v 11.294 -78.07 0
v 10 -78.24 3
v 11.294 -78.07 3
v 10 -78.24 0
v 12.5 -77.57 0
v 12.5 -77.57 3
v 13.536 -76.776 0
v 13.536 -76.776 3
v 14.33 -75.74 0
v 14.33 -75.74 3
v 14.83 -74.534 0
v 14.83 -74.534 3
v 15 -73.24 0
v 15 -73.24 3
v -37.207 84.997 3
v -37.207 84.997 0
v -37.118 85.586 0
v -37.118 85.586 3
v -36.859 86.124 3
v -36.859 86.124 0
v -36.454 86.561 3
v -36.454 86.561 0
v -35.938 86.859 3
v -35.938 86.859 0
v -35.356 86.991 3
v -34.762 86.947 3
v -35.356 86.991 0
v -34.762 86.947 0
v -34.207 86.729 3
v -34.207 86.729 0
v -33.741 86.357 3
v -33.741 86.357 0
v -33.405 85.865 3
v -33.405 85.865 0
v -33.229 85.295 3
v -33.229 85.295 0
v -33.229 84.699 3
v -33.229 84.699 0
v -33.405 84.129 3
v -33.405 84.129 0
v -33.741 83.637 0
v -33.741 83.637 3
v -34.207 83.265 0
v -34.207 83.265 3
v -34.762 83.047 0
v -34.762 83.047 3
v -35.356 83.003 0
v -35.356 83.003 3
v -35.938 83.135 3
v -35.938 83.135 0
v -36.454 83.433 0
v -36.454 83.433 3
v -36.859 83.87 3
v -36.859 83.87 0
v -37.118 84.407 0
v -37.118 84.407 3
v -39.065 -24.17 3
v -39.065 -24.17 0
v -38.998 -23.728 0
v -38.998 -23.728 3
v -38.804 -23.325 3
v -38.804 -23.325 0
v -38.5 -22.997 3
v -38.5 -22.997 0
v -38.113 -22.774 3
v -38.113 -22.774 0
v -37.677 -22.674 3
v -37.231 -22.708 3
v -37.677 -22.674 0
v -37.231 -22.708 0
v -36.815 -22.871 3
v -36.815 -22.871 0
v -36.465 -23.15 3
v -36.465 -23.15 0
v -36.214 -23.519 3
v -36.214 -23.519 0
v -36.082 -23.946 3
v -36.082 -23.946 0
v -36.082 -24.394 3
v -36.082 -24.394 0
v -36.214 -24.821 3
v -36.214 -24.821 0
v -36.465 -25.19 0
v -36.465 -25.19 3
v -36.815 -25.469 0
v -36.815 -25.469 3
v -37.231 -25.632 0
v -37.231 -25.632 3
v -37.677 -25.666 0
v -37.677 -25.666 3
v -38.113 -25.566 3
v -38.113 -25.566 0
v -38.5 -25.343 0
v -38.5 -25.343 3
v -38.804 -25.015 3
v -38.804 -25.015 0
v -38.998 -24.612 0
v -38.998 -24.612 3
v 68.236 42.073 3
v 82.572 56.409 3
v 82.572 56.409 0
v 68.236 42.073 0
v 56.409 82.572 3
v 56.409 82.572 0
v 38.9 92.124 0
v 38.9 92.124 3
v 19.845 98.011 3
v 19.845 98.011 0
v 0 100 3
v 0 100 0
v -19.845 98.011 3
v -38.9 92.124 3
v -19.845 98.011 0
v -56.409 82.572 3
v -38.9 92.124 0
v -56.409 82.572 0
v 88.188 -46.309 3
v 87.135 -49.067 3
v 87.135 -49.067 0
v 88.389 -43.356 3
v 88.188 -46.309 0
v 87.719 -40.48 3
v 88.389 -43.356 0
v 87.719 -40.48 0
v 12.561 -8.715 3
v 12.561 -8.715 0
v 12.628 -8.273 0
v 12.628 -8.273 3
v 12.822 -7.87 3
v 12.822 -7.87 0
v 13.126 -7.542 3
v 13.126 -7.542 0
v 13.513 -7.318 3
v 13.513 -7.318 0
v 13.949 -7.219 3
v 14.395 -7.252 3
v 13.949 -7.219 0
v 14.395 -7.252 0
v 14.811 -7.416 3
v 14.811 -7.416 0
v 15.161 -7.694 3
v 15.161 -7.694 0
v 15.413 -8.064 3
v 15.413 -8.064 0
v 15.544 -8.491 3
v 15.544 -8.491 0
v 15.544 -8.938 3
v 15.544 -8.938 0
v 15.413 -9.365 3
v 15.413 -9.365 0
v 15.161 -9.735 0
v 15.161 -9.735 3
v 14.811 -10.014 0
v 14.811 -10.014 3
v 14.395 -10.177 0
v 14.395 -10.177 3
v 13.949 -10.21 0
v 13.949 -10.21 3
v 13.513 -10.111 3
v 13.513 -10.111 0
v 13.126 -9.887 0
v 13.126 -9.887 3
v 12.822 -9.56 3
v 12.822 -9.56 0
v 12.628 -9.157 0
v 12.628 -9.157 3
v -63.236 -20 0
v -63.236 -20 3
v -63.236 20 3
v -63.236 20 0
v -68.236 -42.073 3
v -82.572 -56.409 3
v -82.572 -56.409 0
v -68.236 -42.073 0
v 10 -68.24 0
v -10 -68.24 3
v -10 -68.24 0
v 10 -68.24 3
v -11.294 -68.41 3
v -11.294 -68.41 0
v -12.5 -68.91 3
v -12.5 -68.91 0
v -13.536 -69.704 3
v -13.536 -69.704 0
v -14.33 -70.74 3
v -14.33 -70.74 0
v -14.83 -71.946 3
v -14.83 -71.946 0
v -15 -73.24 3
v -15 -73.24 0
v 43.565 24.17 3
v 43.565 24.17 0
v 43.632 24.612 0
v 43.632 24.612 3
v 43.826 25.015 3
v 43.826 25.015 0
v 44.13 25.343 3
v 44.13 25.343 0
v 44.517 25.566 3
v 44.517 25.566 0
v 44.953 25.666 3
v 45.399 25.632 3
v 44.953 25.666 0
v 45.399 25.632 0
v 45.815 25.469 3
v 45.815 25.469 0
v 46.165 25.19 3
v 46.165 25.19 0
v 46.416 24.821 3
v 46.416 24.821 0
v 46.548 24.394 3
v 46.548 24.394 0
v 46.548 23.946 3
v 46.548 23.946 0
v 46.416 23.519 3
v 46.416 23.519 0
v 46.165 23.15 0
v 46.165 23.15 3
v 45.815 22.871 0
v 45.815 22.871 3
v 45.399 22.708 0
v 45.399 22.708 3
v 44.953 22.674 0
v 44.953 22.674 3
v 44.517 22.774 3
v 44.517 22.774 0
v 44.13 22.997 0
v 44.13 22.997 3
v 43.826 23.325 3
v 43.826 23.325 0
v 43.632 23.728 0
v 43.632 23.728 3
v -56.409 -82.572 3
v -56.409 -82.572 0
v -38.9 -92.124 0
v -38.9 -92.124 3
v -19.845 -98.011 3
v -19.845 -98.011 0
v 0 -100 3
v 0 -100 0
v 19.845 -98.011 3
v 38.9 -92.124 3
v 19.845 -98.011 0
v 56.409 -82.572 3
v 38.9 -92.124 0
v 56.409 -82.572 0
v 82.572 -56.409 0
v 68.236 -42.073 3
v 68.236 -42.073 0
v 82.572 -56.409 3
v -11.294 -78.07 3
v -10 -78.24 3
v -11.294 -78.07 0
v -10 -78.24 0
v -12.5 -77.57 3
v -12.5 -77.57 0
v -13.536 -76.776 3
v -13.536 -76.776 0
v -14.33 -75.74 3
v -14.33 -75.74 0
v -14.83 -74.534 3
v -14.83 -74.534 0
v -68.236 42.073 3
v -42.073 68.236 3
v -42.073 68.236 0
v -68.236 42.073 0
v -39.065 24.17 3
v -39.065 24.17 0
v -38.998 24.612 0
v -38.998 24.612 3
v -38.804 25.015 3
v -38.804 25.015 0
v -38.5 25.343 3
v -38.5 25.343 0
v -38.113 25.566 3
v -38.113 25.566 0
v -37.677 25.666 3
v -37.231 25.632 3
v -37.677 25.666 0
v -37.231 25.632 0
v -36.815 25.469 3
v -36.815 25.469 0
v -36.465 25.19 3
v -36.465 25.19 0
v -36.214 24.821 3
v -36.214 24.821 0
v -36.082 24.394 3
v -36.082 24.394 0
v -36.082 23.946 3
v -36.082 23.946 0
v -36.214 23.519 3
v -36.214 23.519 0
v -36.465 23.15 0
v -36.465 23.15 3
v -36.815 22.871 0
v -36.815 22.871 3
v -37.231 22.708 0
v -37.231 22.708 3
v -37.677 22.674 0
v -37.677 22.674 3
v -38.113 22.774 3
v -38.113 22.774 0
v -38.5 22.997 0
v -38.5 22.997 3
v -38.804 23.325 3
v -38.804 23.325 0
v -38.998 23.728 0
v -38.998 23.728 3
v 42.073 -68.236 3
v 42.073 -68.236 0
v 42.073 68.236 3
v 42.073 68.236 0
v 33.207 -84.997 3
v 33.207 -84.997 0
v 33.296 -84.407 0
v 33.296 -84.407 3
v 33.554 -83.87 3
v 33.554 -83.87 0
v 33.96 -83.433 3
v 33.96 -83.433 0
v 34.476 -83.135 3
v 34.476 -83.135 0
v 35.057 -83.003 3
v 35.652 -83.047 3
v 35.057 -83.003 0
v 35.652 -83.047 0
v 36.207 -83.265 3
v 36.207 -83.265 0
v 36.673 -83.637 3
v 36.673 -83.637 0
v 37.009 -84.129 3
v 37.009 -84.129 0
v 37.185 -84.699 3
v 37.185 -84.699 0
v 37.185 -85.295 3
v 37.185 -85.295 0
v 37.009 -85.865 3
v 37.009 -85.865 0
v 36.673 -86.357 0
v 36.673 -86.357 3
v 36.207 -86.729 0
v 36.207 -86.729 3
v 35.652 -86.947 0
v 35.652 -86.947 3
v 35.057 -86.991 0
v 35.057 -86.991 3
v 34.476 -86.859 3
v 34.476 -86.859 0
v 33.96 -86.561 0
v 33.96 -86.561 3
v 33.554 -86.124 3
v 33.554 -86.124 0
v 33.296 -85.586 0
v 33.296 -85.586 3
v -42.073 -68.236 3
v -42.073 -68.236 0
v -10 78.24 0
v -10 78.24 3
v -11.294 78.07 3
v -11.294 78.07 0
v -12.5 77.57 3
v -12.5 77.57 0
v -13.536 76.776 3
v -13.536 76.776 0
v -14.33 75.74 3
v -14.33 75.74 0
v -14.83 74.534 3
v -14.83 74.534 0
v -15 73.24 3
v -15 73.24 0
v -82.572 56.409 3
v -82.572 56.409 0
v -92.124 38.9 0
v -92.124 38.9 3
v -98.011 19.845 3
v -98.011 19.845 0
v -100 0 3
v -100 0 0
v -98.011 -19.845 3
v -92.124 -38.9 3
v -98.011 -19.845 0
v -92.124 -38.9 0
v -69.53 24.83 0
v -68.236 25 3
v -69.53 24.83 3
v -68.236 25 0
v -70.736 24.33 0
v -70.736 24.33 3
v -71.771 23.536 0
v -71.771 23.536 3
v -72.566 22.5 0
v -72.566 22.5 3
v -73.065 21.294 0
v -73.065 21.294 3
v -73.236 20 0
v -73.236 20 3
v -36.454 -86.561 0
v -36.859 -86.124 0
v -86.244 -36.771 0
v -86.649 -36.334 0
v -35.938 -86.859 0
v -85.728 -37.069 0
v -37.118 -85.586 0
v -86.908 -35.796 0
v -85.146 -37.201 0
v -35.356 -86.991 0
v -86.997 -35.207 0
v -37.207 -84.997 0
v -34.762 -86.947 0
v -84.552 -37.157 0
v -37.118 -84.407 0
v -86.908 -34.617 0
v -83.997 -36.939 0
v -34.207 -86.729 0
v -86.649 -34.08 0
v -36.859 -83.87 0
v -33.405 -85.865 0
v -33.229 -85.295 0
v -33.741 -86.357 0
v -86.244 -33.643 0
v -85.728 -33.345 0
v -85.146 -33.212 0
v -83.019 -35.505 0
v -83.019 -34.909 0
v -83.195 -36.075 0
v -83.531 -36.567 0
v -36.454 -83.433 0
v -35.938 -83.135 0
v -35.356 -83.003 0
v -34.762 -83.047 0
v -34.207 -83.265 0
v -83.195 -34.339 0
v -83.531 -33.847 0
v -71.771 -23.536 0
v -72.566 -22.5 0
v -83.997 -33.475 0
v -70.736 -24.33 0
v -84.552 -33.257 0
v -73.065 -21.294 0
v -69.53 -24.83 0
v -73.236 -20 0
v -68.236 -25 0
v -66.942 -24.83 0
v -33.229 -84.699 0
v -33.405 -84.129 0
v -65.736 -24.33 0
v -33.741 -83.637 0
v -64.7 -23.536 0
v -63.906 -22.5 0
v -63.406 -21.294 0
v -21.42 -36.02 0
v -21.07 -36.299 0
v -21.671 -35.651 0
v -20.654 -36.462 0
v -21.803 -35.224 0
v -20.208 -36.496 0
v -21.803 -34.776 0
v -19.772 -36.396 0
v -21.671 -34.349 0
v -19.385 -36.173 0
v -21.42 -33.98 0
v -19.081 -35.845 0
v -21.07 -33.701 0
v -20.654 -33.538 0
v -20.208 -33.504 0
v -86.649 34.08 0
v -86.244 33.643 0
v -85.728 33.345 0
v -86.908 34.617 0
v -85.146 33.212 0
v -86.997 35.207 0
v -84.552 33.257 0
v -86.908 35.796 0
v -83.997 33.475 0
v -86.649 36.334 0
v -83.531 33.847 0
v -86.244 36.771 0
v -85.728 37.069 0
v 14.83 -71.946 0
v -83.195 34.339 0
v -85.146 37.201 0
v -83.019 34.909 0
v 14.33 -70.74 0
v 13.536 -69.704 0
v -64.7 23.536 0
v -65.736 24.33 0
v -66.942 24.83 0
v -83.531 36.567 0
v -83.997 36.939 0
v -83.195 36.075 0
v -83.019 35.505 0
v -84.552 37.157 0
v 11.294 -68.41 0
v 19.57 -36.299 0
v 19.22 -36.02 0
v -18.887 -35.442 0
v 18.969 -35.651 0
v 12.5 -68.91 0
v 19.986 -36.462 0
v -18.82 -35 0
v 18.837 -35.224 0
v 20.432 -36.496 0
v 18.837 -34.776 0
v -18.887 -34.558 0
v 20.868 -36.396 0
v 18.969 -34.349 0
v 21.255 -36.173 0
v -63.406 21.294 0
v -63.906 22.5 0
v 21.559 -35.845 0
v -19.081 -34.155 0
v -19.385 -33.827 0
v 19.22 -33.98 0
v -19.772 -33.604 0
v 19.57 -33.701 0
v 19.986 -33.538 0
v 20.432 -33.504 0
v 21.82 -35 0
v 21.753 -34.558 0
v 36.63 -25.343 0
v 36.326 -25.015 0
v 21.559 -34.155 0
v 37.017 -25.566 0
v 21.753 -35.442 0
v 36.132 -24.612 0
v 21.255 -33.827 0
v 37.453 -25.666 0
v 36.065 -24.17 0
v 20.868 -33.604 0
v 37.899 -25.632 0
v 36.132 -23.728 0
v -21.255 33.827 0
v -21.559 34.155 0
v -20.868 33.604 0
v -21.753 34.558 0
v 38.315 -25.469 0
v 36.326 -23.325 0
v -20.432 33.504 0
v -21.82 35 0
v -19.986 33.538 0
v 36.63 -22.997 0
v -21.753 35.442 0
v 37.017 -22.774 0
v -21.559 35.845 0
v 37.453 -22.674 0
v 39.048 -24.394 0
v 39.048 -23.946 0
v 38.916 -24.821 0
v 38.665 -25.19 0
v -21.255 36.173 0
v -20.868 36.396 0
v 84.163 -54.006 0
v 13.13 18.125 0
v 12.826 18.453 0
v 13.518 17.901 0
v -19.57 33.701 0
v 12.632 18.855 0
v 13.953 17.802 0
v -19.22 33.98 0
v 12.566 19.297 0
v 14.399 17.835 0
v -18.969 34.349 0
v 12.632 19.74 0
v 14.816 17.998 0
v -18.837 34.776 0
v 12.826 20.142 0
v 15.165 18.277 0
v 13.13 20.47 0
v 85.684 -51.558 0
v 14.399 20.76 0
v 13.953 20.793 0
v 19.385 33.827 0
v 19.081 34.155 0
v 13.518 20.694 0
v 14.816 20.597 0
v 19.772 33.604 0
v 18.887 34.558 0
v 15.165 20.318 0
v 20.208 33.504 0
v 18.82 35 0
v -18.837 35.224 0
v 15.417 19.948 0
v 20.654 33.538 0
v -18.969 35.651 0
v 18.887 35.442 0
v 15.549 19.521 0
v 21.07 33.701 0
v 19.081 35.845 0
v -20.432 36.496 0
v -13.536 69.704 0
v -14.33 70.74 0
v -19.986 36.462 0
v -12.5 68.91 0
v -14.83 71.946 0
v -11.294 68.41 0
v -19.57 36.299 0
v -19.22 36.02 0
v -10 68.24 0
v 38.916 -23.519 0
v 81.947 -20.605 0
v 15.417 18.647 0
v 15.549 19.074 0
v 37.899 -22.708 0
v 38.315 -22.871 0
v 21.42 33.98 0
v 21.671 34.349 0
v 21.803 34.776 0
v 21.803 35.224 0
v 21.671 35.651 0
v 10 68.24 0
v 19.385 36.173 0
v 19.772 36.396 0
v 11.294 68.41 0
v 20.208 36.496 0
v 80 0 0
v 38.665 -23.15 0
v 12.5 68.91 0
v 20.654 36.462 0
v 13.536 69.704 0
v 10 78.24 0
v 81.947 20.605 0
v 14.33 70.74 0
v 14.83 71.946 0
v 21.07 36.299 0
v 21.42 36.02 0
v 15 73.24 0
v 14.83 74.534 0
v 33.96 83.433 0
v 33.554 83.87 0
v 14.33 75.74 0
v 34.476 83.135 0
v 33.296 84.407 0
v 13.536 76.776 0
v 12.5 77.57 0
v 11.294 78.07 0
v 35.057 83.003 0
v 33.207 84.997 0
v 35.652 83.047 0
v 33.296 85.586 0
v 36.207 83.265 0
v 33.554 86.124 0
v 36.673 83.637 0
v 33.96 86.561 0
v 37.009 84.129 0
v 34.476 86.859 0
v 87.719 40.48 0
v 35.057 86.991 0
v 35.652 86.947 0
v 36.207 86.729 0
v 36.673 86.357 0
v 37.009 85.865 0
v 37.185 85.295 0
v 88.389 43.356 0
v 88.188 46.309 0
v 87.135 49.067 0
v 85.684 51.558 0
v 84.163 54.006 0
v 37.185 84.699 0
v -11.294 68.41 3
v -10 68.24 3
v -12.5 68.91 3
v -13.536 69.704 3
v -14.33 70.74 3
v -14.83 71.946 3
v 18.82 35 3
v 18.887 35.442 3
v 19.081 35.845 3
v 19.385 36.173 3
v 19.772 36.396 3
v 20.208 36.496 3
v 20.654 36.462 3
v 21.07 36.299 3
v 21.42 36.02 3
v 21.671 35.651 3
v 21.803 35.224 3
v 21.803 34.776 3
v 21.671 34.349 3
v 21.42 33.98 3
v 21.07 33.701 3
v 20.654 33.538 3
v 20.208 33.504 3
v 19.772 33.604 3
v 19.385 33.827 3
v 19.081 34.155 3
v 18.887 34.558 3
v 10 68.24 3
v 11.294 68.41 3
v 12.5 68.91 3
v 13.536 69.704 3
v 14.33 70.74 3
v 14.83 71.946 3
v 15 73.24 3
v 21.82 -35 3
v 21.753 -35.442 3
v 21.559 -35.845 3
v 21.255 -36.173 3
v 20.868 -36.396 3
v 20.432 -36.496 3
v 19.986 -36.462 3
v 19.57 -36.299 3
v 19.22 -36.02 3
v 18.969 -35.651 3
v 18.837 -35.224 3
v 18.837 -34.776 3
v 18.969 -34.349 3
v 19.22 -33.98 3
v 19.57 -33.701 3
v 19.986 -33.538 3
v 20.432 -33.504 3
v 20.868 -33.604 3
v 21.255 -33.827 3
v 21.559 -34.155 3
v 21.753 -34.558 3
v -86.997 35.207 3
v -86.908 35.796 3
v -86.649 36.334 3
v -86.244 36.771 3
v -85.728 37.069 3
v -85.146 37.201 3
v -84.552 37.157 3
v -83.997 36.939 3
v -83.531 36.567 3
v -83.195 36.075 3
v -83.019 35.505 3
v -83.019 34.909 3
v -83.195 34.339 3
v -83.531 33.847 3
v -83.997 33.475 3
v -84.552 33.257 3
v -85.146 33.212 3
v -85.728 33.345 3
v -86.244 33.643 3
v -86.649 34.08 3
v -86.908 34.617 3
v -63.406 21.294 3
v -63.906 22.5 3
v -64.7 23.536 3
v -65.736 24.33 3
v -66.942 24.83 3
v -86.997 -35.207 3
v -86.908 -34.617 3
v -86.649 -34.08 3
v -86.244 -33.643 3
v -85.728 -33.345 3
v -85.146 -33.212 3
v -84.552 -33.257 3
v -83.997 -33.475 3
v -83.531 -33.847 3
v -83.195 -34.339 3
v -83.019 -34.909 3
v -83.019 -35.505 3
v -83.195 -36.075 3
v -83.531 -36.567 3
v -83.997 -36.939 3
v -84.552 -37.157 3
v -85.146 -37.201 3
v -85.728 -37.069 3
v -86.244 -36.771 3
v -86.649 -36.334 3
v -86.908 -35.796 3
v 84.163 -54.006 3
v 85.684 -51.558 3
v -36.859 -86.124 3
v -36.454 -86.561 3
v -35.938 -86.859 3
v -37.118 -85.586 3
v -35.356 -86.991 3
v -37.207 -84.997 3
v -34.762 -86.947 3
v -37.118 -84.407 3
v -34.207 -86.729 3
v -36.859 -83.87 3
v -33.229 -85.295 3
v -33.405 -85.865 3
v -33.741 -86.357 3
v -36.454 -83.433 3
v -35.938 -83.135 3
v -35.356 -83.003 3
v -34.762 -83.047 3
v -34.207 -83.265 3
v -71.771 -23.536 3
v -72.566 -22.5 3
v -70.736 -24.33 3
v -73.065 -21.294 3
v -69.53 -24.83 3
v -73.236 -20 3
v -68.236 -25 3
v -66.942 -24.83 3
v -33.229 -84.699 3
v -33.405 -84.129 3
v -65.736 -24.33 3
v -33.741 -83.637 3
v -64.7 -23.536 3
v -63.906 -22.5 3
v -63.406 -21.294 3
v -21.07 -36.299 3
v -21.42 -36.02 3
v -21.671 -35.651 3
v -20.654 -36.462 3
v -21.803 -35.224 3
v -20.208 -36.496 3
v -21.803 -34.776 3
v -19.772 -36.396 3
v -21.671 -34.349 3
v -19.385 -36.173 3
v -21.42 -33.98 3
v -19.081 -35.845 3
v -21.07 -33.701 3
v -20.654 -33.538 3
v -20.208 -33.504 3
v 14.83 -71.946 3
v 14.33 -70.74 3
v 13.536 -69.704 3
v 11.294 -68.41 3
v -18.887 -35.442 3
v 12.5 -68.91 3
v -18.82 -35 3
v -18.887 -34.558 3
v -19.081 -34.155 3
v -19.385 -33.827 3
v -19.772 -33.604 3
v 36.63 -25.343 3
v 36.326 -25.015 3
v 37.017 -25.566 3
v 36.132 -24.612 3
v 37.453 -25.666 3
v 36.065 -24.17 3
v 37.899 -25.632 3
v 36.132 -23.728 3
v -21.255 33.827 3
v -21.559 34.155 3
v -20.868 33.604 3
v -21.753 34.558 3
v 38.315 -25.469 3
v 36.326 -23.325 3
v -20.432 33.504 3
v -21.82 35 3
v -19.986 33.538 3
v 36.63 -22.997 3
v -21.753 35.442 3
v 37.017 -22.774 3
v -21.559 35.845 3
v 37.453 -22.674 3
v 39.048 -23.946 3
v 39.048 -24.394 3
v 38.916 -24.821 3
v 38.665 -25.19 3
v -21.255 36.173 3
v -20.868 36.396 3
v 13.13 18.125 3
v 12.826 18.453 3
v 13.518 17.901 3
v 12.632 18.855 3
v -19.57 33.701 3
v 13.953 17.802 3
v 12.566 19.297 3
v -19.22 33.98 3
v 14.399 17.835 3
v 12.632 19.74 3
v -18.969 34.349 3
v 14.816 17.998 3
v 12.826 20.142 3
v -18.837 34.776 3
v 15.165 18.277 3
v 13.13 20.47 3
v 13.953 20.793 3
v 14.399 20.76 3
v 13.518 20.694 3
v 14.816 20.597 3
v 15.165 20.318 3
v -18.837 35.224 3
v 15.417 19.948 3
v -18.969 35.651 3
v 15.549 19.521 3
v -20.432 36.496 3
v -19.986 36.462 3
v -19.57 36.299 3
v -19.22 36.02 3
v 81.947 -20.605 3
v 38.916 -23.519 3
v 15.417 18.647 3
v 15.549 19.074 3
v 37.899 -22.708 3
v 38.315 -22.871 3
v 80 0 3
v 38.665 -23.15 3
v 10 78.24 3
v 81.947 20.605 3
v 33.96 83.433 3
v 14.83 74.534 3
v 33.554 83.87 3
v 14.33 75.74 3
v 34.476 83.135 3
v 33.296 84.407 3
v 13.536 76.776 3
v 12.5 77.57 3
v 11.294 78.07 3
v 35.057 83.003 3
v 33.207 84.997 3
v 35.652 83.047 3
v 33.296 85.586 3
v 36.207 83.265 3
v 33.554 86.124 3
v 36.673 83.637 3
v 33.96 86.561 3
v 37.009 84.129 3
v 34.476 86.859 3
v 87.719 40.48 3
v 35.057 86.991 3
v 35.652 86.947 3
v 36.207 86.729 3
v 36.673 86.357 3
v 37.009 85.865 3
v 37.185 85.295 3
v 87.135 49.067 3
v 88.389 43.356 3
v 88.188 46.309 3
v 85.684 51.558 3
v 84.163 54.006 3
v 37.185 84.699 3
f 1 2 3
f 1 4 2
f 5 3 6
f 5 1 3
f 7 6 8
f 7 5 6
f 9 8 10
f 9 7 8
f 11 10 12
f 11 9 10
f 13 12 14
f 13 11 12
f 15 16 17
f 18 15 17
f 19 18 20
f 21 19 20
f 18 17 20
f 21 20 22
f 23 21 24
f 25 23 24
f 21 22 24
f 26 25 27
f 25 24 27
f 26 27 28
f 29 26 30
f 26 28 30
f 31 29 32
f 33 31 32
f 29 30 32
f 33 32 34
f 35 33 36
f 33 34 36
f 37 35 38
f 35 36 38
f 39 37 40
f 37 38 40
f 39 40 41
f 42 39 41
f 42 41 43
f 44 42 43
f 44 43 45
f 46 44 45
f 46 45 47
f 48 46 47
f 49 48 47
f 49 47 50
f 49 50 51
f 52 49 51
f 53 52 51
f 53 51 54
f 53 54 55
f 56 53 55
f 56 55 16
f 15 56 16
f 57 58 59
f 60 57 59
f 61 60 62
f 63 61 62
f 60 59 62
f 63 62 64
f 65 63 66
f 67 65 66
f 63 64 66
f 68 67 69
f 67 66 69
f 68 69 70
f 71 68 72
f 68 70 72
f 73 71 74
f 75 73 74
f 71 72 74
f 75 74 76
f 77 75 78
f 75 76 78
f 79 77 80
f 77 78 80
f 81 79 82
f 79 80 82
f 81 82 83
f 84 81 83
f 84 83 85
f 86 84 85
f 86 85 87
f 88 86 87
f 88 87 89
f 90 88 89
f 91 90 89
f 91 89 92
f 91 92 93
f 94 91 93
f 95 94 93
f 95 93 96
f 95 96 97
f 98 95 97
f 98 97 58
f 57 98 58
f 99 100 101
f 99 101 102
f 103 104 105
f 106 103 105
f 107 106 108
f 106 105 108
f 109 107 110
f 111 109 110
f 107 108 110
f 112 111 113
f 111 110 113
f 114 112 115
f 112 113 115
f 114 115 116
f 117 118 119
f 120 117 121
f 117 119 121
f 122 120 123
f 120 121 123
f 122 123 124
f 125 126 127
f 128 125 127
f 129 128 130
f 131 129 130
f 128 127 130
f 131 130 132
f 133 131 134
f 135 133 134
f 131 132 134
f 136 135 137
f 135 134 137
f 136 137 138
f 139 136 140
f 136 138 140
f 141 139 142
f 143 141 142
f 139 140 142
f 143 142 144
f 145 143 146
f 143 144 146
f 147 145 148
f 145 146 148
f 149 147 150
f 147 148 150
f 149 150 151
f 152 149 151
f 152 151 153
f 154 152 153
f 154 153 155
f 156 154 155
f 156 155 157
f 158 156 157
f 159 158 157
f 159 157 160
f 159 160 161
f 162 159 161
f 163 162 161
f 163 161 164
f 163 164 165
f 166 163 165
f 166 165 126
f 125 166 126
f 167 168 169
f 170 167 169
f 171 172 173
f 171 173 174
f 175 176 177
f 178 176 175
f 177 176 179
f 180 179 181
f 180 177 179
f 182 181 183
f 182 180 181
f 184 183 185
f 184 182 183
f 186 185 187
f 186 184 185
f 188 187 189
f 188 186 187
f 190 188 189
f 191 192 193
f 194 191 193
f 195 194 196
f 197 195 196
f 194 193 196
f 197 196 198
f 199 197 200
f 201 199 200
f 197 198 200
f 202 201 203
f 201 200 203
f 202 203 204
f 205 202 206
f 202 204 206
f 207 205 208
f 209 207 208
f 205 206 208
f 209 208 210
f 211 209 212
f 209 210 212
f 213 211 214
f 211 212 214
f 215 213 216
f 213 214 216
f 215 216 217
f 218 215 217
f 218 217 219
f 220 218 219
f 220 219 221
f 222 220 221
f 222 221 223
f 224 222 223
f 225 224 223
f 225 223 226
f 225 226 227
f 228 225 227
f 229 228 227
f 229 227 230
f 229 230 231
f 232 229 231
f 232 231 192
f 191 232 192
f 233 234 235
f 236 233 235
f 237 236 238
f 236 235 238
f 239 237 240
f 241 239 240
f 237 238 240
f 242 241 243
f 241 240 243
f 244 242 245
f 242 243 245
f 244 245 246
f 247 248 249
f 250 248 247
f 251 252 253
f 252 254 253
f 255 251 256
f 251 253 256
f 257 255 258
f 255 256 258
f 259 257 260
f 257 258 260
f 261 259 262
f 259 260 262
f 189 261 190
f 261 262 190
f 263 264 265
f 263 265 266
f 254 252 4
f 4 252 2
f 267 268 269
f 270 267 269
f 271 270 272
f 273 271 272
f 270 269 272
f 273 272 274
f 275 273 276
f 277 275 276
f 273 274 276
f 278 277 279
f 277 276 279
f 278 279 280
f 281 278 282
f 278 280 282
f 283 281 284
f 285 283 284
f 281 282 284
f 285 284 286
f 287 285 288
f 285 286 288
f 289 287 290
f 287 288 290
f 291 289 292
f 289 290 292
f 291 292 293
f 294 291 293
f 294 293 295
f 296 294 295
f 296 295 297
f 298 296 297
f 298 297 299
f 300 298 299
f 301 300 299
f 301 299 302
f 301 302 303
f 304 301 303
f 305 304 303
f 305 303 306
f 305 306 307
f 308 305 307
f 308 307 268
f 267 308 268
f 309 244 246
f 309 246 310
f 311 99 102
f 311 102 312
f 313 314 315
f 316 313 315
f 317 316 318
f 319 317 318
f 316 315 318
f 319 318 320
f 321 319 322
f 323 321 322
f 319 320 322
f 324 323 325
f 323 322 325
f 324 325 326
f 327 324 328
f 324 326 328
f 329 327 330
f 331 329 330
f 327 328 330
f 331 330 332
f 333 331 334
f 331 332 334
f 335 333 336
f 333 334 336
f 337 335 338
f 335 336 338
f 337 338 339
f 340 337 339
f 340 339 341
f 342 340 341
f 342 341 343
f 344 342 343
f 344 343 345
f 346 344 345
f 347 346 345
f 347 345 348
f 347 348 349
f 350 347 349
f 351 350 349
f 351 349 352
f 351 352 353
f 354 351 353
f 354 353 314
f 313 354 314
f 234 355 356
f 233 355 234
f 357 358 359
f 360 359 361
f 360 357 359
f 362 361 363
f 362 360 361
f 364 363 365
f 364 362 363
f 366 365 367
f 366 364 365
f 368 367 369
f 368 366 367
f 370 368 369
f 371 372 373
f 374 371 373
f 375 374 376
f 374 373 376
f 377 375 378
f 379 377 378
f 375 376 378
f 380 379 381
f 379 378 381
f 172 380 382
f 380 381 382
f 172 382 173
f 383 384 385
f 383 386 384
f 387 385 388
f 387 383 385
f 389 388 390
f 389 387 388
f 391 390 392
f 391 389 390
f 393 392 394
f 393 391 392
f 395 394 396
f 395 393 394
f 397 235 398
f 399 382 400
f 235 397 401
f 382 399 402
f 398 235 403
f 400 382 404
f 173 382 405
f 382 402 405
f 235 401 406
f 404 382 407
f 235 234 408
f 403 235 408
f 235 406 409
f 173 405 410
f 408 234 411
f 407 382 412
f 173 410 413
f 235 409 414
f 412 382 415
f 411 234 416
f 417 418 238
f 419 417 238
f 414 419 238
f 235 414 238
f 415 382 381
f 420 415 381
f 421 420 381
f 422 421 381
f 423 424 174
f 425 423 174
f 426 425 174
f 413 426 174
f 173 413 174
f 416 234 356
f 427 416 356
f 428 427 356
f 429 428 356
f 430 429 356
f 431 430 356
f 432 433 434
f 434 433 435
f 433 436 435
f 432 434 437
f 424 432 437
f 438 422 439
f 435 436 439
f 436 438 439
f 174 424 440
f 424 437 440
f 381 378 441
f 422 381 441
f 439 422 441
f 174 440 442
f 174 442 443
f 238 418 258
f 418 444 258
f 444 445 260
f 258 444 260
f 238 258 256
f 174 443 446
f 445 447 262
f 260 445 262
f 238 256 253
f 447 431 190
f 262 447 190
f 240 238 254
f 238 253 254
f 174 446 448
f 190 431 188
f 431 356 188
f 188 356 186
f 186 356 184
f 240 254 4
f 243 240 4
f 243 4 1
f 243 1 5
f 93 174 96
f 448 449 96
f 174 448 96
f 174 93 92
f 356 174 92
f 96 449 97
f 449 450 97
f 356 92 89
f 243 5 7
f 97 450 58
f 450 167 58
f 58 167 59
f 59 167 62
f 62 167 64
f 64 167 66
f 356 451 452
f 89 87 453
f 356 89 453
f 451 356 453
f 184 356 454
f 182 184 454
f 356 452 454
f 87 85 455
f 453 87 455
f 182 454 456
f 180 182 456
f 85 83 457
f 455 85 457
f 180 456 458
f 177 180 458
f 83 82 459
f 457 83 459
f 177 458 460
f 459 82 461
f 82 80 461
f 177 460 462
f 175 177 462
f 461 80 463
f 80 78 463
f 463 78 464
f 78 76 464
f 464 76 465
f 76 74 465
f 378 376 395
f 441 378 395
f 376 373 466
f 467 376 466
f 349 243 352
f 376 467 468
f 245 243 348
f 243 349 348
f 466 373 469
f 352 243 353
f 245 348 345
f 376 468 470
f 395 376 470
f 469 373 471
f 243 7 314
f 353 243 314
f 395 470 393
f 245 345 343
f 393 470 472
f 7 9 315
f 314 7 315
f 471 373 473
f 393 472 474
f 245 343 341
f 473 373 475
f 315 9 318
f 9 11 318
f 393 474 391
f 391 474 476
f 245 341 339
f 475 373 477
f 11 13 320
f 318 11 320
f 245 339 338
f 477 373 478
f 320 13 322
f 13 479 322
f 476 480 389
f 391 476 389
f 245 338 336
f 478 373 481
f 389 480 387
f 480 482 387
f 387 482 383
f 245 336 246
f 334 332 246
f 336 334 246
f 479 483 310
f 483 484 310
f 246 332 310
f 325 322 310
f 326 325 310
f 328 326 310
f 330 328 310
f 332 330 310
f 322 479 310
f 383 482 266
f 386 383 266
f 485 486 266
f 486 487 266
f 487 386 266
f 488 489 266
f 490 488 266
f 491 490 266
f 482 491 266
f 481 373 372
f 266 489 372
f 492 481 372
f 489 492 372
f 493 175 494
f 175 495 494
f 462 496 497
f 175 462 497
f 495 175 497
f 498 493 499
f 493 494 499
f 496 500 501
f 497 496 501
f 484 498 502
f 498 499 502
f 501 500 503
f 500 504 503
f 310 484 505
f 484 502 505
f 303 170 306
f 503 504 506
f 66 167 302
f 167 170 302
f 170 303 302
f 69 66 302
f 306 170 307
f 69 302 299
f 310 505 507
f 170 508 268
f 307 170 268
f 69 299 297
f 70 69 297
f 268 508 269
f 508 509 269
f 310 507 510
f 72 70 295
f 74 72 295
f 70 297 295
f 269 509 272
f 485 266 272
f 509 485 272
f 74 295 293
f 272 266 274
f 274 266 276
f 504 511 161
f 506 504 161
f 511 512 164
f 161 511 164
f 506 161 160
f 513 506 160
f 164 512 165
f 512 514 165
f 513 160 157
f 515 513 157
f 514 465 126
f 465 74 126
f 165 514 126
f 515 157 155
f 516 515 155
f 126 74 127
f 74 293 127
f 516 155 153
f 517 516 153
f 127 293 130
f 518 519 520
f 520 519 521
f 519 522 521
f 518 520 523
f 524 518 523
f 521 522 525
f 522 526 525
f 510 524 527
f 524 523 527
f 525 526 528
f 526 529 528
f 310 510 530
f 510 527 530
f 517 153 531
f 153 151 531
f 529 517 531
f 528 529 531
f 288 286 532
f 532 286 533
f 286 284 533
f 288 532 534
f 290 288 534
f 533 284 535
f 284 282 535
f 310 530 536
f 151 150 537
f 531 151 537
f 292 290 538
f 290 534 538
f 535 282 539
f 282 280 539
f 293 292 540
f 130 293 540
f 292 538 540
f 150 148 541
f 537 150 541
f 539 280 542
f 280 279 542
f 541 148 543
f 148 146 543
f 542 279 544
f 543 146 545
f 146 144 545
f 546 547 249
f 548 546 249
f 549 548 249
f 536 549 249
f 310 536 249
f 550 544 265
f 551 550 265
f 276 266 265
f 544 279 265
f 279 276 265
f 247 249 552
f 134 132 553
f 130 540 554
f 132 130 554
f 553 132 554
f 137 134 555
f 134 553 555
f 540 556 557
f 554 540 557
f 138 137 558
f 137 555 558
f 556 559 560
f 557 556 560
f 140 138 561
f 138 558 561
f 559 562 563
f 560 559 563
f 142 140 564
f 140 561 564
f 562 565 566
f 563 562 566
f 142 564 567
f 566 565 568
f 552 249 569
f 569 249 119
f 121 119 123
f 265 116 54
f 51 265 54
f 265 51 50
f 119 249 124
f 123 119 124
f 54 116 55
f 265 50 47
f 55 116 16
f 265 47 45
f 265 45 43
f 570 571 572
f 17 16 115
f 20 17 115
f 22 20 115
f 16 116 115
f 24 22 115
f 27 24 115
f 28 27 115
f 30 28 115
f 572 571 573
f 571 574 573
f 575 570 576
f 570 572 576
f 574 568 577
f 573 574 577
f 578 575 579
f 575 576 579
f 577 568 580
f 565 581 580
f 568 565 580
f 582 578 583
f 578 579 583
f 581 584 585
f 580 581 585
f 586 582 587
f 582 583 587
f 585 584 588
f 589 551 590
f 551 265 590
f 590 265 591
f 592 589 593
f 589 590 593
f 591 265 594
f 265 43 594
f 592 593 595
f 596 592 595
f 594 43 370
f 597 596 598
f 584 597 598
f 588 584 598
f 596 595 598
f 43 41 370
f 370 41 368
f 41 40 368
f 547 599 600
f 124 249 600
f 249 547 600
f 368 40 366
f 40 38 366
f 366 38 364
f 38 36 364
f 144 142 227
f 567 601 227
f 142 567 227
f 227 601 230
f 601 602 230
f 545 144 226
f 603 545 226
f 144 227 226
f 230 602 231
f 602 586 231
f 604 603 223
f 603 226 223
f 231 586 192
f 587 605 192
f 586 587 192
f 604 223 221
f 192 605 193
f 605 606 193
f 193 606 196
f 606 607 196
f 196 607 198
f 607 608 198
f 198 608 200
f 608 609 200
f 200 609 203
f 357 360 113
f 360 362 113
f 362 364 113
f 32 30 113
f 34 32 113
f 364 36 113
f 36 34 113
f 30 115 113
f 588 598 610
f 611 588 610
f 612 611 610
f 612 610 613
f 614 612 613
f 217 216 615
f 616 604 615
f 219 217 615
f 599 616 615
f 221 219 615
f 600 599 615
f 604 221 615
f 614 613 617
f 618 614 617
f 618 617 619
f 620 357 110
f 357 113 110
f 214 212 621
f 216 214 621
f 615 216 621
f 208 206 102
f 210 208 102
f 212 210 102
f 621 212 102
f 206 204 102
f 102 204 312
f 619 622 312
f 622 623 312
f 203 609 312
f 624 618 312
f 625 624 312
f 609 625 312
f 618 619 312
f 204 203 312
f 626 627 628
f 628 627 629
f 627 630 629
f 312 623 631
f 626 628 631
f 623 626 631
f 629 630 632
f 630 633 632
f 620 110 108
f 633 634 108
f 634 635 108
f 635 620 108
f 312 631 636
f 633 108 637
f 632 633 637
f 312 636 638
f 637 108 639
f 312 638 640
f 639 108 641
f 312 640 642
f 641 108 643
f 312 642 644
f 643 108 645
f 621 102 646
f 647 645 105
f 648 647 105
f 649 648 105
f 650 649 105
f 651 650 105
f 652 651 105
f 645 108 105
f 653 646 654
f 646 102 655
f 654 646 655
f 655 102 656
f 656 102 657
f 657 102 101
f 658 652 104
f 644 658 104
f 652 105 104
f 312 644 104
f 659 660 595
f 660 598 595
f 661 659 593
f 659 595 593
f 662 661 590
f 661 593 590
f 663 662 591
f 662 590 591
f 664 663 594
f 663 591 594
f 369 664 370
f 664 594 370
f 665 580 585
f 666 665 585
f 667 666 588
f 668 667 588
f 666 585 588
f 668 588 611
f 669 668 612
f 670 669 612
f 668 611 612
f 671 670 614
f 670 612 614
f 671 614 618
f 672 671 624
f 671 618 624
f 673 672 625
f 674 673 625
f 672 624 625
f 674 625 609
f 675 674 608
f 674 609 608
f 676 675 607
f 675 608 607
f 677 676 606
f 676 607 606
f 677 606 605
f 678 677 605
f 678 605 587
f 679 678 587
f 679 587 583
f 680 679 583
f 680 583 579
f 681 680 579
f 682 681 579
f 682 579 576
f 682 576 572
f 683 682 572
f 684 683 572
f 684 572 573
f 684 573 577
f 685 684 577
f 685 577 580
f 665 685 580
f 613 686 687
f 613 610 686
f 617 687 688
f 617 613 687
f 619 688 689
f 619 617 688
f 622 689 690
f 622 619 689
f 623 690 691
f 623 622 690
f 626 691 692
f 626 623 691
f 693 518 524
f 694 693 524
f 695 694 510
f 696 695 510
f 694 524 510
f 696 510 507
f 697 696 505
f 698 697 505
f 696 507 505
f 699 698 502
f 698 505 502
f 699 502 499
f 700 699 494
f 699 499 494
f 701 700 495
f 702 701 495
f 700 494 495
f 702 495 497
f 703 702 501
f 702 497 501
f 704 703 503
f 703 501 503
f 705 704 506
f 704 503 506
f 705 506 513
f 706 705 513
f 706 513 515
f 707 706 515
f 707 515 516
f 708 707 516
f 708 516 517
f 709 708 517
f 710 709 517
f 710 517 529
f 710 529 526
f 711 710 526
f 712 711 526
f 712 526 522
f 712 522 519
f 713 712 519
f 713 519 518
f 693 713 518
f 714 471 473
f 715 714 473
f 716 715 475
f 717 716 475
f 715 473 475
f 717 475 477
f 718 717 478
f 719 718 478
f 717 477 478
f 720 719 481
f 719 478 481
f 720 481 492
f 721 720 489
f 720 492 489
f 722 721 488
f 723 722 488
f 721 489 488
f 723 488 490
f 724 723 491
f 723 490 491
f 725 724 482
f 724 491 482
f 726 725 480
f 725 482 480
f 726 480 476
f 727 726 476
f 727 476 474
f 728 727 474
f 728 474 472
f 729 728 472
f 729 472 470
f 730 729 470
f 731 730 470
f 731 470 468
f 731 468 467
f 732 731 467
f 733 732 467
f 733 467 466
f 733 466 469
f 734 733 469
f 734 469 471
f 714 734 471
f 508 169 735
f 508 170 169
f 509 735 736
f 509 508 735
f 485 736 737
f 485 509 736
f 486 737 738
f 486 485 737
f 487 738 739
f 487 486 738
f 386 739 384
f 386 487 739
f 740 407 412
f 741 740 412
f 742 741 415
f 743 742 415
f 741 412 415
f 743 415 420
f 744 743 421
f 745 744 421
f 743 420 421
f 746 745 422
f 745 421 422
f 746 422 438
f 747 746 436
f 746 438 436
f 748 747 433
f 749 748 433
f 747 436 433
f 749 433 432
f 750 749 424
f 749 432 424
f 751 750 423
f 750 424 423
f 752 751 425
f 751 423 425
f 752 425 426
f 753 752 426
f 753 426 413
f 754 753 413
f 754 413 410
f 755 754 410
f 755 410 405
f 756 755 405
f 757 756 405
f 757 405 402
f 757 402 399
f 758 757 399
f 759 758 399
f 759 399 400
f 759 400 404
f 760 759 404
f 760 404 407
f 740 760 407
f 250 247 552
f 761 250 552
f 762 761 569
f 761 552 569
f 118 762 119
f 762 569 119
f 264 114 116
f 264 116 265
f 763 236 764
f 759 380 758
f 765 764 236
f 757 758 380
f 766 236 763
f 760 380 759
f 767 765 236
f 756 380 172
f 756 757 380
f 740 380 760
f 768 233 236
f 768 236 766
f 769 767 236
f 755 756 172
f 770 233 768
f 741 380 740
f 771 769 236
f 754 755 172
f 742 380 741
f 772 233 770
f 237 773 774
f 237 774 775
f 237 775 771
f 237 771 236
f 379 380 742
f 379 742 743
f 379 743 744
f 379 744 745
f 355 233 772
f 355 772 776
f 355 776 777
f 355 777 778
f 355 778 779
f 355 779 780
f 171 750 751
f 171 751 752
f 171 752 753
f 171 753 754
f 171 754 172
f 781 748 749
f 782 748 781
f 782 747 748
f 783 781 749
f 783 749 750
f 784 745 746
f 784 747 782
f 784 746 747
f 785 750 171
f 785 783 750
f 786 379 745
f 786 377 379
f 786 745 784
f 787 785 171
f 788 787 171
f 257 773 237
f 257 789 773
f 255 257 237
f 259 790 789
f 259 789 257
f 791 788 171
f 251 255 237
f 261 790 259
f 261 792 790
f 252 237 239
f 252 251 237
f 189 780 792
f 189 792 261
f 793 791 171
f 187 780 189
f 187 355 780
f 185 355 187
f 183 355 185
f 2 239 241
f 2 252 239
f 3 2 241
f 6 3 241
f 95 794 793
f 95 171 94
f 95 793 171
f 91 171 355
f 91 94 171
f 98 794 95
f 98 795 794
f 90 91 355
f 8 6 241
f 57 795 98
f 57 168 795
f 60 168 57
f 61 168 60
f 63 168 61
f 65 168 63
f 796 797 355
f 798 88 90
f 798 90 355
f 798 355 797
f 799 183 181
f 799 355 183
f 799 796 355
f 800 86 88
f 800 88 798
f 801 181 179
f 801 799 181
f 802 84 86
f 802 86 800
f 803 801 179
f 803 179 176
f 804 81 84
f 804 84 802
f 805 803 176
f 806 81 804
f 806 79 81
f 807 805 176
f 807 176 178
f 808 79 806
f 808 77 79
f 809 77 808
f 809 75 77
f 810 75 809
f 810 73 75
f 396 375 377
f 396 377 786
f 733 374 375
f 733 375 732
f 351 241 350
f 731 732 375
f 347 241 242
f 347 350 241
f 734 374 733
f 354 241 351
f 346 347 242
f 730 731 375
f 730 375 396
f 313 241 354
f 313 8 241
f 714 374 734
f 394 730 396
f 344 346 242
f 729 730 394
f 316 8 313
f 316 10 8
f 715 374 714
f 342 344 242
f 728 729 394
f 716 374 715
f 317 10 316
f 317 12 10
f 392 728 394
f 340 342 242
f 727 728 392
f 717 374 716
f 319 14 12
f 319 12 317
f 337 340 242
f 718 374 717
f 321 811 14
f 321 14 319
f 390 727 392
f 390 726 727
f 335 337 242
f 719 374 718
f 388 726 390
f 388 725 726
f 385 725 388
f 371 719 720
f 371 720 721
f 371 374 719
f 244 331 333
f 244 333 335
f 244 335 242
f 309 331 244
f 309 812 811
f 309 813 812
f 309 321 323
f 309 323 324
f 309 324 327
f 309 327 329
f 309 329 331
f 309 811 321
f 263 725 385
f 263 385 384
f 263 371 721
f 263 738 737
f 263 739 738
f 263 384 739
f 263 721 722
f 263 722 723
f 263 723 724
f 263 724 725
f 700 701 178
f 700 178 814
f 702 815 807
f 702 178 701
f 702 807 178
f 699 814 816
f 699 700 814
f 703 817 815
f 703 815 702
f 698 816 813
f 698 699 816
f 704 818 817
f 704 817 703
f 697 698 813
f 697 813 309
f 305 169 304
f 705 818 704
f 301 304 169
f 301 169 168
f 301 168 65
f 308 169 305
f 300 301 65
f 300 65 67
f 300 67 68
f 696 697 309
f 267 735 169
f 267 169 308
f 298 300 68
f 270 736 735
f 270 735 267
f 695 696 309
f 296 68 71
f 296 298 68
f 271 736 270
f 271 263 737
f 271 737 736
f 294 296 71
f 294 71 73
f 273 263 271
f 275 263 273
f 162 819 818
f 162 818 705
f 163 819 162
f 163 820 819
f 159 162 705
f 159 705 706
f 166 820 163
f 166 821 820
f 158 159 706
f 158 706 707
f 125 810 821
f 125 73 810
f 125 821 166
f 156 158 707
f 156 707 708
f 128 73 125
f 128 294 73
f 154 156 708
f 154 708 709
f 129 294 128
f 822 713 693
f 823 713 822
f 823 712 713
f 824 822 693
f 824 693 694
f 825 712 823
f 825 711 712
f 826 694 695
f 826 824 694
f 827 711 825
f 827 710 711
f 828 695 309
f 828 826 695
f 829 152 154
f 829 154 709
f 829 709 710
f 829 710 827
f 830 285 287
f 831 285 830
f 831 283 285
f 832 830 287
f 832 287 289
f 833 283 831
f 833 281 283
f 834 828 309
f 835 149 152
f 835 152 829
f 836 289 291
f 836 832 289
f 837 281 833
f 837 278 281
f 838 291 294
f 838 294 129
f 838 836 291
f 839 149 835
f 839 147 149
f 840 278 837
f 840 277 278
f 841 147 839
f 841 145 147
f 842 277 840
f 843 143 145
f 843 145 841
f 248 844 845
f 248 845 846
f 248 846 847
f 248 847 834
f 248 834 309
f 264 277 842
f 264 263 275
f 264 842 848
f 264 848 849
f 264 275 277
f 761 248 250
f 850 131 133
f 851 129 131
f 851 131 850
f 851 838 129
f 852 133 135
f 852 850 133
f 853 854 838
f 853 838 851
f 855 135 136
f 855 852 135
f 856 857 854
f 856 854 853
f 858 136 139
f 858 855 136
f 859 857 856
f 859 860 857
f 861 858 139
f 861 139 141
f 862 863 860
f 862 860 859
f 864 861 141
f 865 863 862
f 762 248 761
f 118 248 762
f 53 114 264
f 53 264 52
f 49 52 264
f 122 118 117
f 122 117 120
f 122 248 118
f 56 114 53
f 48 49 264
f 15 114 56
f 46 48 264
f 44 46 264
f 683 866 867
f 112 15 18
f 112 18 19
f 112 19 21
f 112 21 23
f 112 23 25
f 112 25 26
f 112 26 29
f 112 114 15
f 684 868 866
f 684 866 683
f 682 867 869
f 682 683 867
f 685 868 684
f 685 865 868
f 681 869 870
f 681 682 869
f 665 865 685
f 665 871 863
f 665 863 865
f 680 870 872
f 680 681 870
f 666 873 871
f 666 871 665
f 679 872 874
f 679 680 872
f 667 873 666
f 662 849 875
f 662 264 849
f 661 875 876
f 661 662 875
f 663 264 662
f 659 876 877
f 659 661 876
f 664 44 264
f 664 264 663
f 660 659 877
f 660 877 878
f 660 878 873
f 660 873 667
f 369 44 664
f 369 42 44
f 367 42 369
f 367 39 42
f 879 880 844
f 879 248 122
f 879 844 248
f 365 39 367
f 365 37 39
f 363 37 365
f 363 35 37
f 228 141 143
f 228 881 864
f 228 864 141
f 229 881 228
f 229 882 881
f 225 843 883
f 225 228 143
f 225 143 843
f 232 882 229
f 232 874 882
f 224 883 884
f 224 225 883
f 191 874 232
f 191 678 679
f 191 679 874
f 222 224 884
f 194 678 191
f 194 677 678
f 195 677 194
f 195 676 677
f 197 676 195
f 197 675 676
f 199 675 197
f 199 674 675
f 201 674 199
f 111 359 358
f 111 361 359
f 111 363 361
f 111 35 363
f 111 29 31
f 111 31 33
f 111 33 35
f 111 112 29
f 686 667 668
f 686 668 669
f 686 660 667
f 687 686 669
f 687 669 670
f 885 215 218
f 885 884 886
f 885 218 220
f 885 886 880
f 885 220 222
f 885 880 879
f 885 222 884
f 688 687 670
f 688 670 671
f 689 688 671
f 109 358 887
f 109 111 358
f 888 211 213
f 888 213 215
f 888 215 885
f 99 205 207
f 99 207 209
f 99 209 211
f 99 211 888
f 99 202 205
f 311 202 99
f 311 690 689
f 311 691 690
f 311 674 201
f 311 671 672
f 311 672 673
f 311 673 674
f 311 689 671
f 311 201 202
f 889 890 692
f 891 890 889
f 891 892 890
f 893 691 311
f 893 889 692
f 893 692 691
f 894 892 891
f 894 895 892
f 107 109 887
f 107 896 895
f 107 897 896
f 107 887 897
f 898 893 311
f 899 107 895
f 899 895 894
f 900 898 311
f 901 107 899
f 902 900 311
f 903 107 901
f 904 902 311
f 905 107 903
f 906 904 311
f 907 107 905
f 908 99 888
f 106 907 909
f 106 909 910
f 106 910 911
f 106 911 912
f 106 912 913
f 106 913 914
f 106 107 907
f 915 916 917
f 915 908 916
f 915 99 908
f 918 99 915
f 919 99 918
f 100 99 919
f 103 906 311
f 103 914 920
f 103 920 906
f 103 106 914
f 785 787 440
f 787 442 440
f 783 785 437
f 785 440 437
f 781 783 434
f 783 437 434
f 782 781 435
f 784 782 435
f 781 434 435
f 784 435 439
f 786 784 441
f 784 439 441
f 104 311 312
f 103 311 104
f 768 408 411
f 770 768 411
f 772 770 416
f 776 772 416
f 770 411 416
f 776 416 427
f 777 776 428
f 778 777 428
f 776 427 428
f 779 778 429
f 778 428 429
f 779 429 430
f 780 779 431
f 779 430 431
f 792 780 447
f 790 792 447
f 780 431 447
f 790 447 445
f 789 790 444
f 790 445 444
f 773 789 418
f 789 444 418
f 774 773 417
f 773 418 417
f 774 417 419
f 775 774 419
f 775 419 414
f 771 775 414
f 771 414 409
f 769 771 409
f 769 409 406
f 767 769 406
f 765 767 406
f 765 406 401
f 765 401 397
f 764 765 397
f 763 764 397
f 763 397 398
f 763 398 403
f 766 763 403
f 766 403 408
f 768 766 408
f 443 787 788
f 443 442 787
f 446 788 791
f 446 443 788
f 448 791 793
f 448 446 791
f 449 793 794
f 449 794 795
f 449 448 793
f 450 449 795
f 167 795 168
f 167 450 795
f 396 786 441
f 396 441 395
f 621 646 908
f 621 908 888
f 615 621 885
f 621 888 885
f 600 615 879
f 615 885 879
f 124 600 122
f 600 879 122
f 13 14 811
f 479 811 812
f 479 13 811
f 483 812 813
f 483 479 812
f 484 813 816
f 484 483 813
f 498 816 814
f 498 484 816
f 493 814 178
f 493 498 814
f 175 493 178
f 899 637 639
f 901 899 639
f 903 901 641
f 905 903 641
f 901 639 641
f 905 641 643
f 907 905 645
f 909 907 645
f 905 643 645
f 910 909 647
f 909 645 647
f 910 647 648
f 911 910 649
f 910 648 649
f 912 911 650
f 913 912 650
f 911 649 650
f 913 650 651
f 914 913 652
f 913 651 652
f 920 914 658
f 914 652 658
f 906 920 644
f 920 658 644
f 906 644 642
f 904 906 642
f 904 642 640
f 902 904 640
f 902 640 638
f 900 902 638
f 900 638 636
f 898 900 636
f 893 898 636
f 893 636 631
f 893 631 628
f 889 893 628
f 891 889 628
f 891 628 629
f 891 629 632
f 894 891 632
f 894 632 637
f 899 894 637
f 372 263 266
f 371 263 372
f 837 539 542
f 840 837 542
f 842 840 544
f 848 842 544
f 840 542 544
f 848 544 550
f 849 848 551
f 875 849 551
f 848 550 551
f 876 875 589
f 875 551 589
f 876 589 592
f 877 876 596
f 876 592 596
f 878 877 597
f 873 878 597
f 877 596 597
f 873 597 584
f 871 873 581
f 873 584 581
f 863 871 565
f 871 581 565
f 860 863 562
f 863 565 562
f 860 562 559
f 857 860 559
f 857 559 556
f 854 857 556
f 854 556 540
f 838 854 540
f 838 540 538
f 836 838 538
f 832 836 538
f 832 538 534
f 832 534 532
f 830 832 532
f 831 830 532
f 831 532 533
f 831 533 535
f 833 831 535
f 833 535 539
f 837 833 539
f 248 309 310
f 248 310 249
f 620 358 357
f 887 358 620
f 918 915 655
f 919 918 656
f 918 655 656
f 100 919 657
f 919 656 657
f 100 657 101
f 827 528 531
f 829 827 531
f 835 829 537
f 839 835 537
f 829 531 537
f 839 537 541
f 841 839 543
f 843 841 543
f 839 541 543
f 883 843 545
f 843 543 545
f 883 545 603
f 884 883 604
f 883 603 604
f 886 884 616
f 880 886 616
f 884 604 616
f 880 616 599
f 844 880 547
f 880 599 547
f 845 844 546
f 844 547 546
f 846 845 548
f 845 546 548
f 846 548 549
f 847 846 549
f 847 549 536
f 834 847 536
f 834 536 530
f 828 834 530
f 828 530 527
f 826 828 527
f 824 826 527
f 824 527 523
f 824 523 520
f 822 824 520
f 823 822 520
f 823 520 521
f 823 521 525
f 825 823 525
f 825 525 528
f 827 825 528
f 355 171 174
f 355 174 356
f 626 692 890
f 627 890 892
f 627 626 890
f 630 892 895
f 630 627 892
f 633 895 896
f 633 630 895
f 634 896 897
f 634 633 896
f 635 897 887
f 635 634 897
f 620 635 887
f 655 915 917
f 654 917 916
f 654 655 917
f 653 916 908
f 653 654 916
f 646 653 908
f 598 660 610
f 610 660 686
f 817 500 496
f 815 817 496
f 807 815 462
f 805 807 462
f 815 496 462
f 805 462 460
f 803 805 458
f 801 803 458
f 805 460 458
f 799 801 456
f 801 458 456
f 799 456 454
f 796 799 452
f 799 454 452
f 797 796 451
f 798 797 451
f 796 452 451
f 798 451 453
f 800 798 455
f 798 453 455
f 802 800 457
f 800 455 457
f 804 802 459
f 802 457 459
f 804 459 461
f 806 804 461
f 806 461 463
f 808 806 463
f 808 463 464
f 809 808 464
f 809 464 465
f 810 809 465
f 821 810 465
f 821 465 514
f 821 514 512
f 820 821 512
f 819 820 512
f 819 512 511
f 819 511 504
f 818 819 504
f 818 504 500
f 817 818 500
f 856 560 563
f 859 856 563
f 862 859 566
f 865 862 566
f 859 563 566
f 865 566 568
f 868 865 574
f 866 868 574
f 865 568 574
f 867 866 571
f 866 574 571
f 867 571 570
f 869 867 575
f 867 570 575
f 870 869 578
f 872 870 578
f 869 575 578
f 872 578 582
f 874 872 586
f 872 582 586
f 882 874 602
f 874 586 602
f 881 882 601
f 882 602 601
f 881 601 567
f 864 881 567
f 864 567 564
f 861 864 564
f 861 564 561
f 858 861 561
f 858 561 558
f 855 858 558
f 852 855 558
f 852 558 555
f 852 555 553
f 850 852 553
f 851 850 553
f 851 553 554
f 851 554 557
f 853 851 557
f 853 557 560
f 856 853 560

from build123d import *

# Parameters (mm, degrees)
CROQUIS1_R              = 100
SALIENTE_EXTRUIR1_DEPTH = 3
CROQUIS3_R              = 110
CORTAR_EXTRUIR1_DEPTH   = 3
REDONDEO1_R             = 10
CORTAR_EXTRUIR2_DEPTH   = 142.453172607
CROQUIS6_W              = 10
CROQUIS6_H              = 50
CROQUIS6_W_2            = 30
CROQUIS6_H_2            = 10
CORTAR_EXTRUIR4_DEPTH   = 10
REDONDEO3_R             = 5
CROQUIS7_R              = 1.5
CORTAR_EXTRUIR5_DEPTH   = 142.453172607
CROQUIS8_R              = 1.5
CORTAR_EXTRUIR6_DEPTH   = 142.453172607
CROQUIS9_R              = 2
CORTAR_EXTRUIR7_DEPTH   = 142.453172607


with BuildPart() as part:
    # Croquis1 → Saliente-Extruir1 (new body)
    with BuildSketch(Plane.XY):
        Circle(CROQUIS1_R)
    extrude(amount=SALIENTE_EXTRUIR1_DEPTH)

    # Croquis3 → Cortar-Extruir1 (cut)
    with BuildSketch(Plane.XY.offset(3)):
        with Locations((190, 0)):
            Circle(CROQUIS3_R)
    extrude(amount=-CORTAR_EXTRUIR1_DEPTH, mode=Mode.SUBTRACT)

    # Redondeo1
    redondeo1_edges = [part.edges().sort_by_distance(p)[0] for p in [
        (89.473684211, -44.659375654, 1.5),
        (89.473684211, 44.659375654, 1.5),
    ]]
    fillet(redondeo1_edges, radius=REDONDEO1_R)

    # Croquis4 → Cortar-Extruir2 (cut, through all)
    with BuildSketch(Plane.XY.offset(3)):
        Polygon((-57.629202667, -83.792153571), (-83.792153571, -57.629202667), (-68.235804385, -42.072853481), (-42.072853481, -68.235804385), align=None)
        Polygon((-57.629202667, 83.792153571), (-42.072853481, 68.235804385), (-68.235804385, 42.072853481), (-83.792153571, 57.629202667), align=None)
        Polygon((83.792153571, 57.629202667), (68.235804385, 42.072853481), (42.072853481, 68.235804385), (57.629202667, 83.792153571), align=None)
        Polygon((57.629202667, -83.792153571), (42.072853481, -68.235804385), (68.235804385, -42.072853481), (83.792153571, -57.629202667), align=None)
    extrude(amount=-CORTAR_EXTRUIR2_DEPTH, mode=Mode.SUBTRACT)

    # Croquis6 → Cortar-Extruir4 (cut)
    with BuildSketch(Plane.XY.offset(3)):
        with Locations((-68.235804385, 0)):
            Rectangle(CROQUIS6_W, CROQUIS6_H)
        with Locations((0, 73.24)):
            Rectangle(CROQUIS6_W_2, CROQUIS6_H_2)
        with Locations((0, -73.24)):
            Rectangle(CROQUIS6_W_2, CROQUIS6_H_2)
    extrude(amount=-CORTAR_EXTRUIR4_DEPTH, mode=Mode.SUBTRACT)

    # Redondeo3
    redondeo3_edges = [part.edges().sort_by_distance(p)[0] for p in [
        (15, -78.24, 1.5),
        (-15, -78.24, 1.5),
        (15, -68.24, 1.5),
        (-15, -68.24, 1.5),
        (-73.235804385, -25, 1.5),
        (-63.235804385, -25, 1.5),
        (-73.235804385, 25, 1.5),
        (-63.235804385, 25, 1.5),
        (-15, 68.24, 1.5),
        (15, 68.24, 1.5),
        (-15, 78.24, 1.5),
        (15, 78.24, 1.5),
    ]]
    fillet(redondeo3_edges, radius=REDONDEO3_R - 0.0001)  # a hair under: the kernel refuses the full size

    # Croquis7 → Cortar-Extruir5 (cut, through all)
    with BuildSketch(Plane(origin=(0, 0, 0), x_dir=(-1, 0, 0), z_dir=(0, 0, -1))):
        with Locations((37.565, -24.17)):
            Circle(CROQUIS7_R)
        with Locations((-37.565, -24.17)):
            Circle(CROQUIS7_R)
        with Locations((-45.065, 24.17)):
            Circle(CROQUIS7_R)
        with Locations((37.565, 24.17)):
            Circle(CROQUIS7_R)
        with Locations((-14.06559482, 19.297497716)):
            Circle(CROQUIS7_R)
        with Locations((-14.061195262, -8.714642909)):
            Circle(CROQUIS7_R)
    extrude(amount=-CORTAR_EXTRUIR5_DEPTH, mode=Mode.SUBTRACT)

    # Croquis8 → Cortar-Extruir6 (cut, through all)
    with BuildSketch(Plane(origin=(0, 0, 0), x_dir=(-1, 0, 0), z_dir=(0, 0, -1))):
        with Locations((-20.32, 35)):
            Circle(CROQUIS8_R)
        with Locations((20.32, 35)):
            Circle(CROQUIS8_R)
        with Locations(Location((20.32, -35, 0), (0, 0, 180))):
            Circle(CROQUIS8_R)
        with Locations(Location((-20.32, -35, 0), (0, 0, 180))):
            Circle(CROQUIS8_R)
    extrude(amount=-CORTAR_EXTRUIR6_DEPTH, mode=Mode.SUBTRACT)

    # Croquis9 → Cortar-Extruir7 (cut, through all)
    with BuildSketch(Plane(origin=(0, 0, 0), x_dir=(-1, 0, 0), z_dir=(0, 0, -1))):
        with Locations((-35.206875778, 84.996916991)):
            Circle(CROQUIS9_R)
        with Locations((35.206875778, 84.996916991)):
            Circle(CROQUIS9_R)
        with Locations((84.996916991, 35.206875778)):
            Circle(CROQUIS9_R)
        with Locations((84.996916991, -35.206875778)):
            Circle(CROQUIS9_R)
        with Locations((35.206875778, -84.996916991)):
            Circle(CROQUIS9_R)
        with Locations((-35.206875778, -84.996916991)):
            Circle(CROQUIS9_R)
    extrude(amount=-CORTAR_EXTRUIR7_DEPTH, mode=Mode.SUBTRACT)


solid = part.part
